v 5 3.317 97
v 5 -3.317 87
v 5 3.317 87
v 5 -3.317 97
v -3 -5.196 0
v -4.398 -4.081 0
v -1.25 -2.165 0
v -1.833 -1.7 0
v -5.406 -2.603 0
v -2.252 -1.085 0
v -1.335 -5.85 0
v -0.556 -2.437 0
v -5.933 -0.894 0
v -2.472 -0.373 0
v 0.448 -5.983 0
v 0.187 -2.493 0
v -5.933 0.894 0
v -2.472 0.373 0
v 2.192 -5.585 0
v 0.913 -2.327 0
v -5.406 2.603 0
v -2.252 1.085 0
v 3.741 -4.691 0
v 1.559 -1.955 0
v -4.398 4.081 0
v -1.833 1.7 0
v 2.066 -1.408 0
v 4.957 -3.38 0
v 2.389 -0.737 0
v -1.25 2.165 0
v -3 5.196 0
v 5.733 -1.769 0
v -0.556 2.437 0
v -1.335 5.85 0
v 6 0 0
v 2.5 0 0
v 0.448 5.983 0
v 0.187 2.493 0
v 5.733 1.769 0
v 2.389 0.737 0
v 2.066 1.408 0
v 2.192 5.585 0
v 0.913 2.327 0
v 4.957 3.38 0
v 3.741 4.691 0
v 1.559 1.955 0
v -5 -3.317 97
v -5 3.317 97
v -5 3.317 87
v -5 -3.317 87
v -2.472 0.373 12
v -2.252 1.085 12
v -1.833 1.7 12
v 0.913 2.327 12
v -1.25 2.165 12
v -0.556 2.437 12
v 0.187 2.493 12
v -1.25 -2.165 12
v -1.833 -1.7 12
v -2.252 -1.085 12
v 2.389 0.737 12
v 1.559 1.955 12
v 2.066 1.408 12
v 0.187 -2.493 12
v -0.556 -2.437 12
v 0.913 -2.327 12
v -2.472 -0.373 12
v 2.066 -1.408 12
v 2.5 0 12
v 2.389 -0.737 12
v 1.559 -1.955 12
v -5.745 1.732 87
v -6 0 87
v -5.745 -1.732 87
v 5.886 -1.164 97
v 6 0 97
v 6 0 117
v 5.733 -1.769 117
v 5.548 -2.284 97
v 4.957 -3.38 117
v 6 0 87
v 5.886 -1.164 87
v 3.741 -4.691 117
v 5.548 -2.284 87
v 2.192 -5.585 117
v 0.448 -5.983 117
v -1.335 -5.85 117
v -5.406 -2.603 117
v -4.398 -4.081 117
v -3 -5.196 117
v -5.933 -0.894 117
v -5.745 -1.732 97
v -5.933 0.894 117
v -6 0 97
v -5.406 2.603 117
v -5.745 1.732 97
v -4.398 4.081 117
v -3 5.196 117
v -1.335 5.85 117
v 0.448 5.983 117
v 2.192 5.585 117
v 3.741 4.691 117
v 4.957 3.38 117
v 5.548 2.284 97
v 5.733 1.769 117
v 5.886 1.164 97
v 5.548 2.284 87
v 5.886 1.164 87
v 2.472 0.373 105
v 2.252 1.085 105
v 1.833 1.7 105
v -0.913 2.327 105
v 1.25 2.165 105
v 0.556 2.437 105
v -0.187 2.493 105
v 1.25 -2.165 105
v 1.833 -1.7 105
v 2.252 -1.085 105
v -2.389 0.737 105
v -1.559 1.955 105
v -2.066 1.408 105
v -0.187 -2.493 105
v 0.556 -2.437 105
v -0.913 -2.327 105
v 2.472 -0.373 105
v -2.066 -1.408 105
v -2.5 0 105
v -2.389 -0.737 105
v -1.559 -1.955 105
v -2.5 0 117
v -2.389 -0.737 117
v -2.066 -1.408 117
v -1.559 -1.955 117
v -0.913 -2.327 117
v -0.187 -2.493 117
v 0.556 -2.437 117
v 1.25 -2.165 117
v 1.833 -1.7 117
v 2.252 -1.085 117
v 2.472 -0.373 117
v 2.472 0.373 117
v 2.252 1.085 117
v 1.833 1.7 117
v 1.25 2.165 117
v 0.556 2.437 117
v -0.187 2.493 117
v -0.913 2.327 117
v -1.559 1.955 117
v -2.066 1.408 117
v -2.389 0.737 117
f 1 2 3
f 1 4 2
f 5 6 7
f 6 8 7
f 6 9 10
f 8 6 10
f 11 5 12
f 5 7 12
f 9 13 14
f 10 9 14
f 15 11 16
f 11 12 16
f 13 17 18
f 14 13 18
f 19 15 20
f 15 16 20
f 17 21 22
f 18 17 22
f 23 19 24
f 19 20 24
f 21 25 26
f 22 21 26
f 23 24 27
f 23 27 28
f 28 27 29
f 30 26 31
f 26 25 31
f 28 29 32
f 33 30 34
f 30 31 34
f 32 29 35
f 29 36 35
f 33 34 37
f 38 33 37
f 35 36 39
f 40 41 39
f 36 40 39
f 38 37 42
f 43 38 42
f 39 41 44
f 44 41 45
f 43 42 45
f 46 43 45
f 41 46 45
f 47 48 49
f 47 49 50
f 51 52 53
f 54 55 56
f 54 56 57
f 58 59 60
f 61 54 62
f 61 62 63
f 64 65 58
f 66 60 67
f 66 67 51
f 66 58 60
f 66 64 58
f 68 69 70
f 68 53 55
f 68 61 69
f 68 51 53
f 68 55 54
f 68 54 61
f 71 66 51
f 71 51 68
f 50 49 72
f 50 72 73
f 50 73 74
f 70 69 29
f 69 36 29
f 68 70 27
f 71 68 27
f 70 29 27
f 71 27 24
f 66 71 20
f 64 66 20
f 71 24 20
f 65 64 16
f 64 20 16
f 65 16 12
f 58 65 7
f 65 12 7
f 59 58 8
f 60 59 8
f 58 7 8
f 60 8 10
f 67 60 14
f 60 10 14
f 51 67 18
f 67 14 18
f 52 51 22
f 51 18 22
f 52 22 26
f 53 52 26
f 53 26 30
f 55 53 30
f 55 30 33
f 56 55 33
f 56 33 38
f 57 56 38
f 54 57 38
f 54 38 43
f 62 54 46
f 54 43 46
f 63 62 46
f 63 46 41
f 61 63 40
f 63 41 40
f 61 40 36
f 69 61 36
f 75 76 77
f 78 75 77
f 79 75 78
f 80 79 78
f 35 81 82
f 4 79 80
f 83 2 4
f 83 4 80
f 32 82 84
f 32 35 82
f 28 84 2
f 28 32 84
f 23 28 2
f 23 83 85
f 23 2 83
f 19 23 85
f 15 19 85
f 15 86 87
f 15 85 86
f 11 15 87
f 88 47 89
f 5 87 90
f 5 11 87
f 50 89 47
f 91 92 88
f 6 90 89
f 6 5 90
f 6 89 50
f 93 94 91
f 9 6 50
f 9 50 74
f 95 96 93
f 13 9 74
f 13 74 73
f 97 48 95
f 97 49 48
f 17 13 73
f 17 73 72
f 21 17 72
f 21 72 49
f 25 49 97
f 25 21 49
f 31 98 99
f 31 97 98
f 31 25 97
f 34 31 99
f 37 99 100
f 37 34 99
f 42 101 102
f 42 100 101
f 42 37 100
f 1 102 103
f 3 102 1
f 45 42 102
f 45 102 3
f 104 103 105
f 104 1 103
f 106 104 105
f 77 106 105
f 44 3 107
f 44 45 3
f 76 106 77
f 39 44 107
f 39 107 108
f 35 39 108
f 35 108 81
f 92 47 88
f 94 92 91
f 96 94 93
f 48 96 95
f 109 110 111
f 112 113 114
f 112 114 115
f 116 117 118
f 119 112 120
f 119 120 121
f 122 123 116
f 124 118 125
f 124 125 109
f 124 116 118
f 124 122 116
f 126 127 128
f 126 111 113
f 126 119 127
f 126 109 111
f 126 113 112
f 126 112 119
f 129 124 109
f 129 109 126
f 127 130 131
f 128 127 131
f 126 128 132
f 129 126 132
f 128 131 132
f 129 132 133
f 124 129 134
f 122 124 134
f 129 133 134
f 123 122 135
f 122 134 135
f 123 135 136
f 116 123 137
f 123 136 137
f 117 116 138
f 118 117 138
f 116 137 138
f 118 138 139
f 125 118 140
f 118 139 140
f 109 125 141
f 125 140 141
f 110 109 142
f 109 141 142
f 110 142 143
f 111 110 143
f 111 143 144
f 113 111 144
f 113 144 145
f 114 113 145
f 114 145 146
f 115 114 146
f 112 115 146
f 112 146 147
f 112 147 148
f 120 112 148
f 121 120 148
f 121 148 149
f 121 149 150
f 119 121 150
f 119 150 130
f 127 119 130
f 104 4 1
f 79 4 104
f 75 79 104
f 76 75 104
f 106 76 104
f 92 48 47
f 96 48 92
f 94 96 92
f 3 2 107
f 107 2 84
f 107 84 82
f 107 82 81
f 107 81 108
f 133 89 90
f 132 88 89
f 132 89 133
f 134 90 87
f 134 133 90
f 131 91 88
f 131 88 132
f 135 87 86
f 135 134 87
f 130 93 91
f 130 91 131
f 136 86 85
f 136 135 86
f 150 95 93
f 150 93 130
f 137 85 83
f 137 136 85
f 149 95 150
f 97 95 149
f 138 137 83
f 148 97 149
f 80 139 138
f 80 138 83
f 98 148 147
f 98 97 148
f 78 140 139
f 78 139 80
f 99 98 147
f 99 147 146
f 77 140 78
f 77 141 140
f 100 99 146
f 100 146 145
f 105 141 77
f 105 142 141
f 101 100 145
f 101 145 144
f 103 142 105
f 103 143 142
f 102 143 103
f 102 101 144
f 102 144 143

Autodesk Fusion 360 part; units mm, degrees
sketch "Esquisse1" plane through (0, 0, 0) normal (0, 0, 1) x (1, 0, 0)
  circle A0 centre (0, 0) radius 6
  dimension "d1" = 12
extrude "Extrusion1" add sketch "Esquisse1" along normal blind 117
sketch "Esquisse2" plane through (0, 0, 117) normal (0, 0, 1) x (-1, 0, 0)
  circle A0 centre (0, 0) radius 6
  circle A1 centre (0, 0) radius 2.5
  dimension "d5" = 5
extrude "Extrusion2" cut sketch "Esquisse2" against normal blind 12 contours A1
sketch "Esquisse3" plane through (0, 0, 0) normal (0, 0, -1) x (1, 0, 0)
  circle A0 centre (0, 0) radius 6
  circle A1 centre (0, 0) radius 2.5
  dimension "d8" = 5
extrude "Extrusion3" cut sketch "Esquisse3" against normal blind 12 contours A1
sketch "Esquisse4" plane through (0, 0, 117) normal (0, 0, 1) x (-1, 0, 0)
  circle A0 centre (0, 0) radius 2.5
  circle A1 centre (0, 0) radius 6
  line L0 (5, 8) -> (-5, 8)
  line L1 (-5, 8) -> (-5, -7.4606)
  line L2 (-5, -7.4606) -> (5, -7.4606)
  line L3 (5, -7.4606) -> (5, 8)
  dimension "d11" = 5
  dimension "d12" = 10
extrude "Extrusion4" cut sketch "Esquisse4" against normal blind 10 from surface at -20 contours A1 L3 | A1 L1
